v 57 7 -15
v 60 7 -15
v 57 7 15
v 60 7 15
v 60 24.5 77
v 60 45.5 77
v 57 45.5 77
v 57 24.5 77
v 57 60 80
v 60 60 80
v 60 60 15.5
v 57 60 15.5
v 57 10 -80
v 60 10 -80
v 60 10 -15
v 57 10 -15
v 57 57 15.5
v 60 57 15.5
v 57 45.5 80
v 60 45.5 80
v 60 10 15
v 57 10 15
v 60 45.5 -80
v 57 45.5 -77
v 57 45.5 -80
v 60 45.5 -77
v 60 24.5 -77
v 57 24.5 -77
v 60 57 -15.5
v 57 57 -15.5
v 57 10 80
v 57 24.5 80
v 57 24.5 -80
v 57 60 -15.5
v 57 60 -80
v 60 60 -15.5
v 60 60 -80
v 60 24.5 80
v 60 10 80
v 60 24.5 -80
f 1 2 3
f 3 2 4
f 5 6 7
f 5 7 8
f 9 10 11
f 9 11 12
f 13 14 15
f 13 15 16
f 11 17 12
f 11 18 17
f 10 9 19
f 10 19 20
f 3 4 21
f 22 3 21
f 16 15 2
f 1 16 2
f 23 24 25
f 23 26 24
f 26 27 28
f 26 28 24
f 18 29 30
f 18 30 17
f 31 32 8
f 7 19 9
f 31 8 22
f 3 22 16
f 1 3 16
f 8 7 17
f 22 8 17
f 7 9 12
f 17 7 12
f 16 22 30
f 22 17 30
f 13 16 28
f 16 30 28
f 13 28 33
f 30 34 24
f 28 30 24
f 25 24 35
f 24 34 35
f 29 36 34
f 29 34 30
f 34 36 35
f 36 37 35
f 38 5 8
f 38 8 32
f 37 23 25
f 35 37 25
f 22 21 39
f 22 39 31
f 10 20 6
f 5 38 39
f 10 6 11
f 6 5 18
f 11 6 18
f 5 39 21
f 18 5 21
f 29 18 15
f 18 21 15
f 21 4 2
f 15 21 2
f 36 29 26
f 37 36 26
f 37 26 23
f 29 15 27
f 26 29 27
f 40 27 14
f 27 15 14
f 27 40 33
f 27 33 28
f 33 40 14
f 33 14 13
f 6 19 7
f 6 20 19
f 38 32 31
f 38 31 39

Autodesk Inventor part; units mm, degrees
ref_plane "YZ Plane" through (0, 0, 0) normal (1, 0, 0) x (0, 1, 0)
ref_plane "XZ Plane" through (0, 0, 0) normal (0, 1, 0) x (-1, 0, 0)
ref_plane "XY Plane" through (0, 0, 0) normal (0, 0, 1) x (1, 0, 0)
sketch "스케치1" plane through (0, 0, 0) normal (0, 1, 0) x (-1, 0, 0)
  line L0 (60, 80) -> (-60, 80)
  line L1 (-60, 80) -> (-60, -80)
  line L2 (-60, -80) -> (60, -80)
  line L3 (60, -80) -> (60, 80)
  line L4 (60, 80) -> (-60, -80) construction
  line L5 (-60, 80) -> (60, -80) construction
  point P0 (0, 0)
  dimension "d0" = 120
  dimension "d1" = 160
extrude "돌출1" add sketch "스케치1" along normal blind 60
sketch "스케치2" plane through (0, 60, 0) normal (0, 1, 0) x (1, 0, 0)
  line L0 (60, -80) -> (60, 80) projected
  line L1 (60, 80) -> (-60, 80) projected
  line L2 (55, 102.1646) -> (-55, 102.1646)
  line L3 (-55, 102.1646) -> (-55, -89.711)
  line L4 (-55, -89.711) -> (55, -89.711)
  line L5 (55, -89.711) -> (55, 102.1646)
  line L6 (-60, 80) -> (-60, -80) projected
  point P0 (0, 0)
  point P1 (55, 80)
  point P2 (-55, 80)
  dimension "d6" = 5
  dimension "d7" = 5
extrude "돌출2" cut sketch "스케치2" against normal blind 40 contours L5 L4 L3 L1
sketch "스케치12" plane through (60, 0, -80) normal (0, 0, -1) x (-1, 0, 0)
  line L0 (-34.8463, 10) -> (156.2634, 10)
  line L1 (156.2634, 10) -> (156.2634, -36.9465)
  line L2 (156.2634, -36.9465) -> (-34.8463, -36.9465)
  line L3 (-34.8463, -36.9465) -> (-34.8463, 10)
  line L4 (0, 0) -> (120, 0) projected
  point P0 (60, 0)
  dimension "d85" = 10
extrude "돌출10" cut sketch "스케치12" against normal through all
sketch "스케치13" plane through (-55, 20, 80) normal (0, 0, 1) x (1, 0, 0)
  line L0 (0, 40) -> (0, 0) projected
  line L1 (0, 0) -> (110, 0) projected
  line L2 (0, 40) -> (110, 40)
  line L3 (110, 40) -> (110, 0)
  line L4 (110, 0) -> (0, 0)
  line L5 (0, 0) -> (0, 40)
  point P0 (55, -20)
extrude "돌출11" add sketch "스케치13" against normal blind 5
sketch "스케치14" plane through (55, 20, -80) normal (0, 0, -1) x (-1, 0, 0)
  line L0 (0, 0) -> (0, 40) projected
  line L1 (110, 0) -> (0, 0) projected
  line L2 (0, 40) -> (110, 40)
  line L3 (110, 40) -> (110, 0)
  line L4 (110, 0) -> (0, 0)
  line L5 (0, 0) -> (0, 40)
  point P0 (55, -20)
extrude "돌출12" add sketch "스케치14" against normal blind 5
sketch "스케치15" plane through (60, 60, -80) normal (0, 0, -1) x (-1, 0, 0)
  point P0 (60, -60)
sketch "스케치16" plane through (60, 60, -80) normal (0, 0, -1) x (-1, 0, 0)
  point P0 (60, -60)
sketch "스케치17" plane through (0, 20, 0) normal (0, 1, 0) x (1, 0, 0)
  line L0 (7, 27) -> (45, 27)
  line L1 (45, 27) -> (45, 65)
  line L2 (45, 65) -> (7, 65)
  line L3 (7, 65) -> (7, 27)
  line L4 (55, 75) -> (55, -75) projected
  line L5 (55, 75) -> (-55, 75) projected
  circle A0 centre (7, 27) radius 1.6
  circle A1 centre (7, 65) radius 1.6
  circle A2 centre (45, 65) radius 1.6
  circle A3 centre (45, 27) radius 1.6
  line L6 (-47.9371, 14.7215) -> (-7.9371, 14.7215)
  line L7 (-7.9371, 14.7215) -> (-7.9371, 64.7215)
  line L8 (-7.9371, 64.7215) -> (-47.9371, 64.7215)
  line L9 (-47.9371, 64.7215) -> (-47.9371, 14.7215)
  point P0 (0, 0)
  dimension "d92" = 38
  dimension "d93" = 38
  dimension "d95" = 10
  dimension "d96" = 10
  dimension "d97" = 3.2
  dimension "d98" = 3.2
  dimension "d99" = 3.2
  dimension "d100" = 3.2
  dimension "d113" = 40
  dimension "d114" = 50
extrude "돌출13" cut sketch "스케치17" against normal through all contours L3 A0 L0 | L0 A0 L3 | A3 L1 L0 | L0 L1 A3 | A1 L2 L3 | L3 L2 A1 | A2 L2 L1 | L1 L2 A2
sketch "스케치19" plane through (60, 60, -80) normal (0, 0, -1) x (-1, 0, 0)
  line L0 (5, -40) -> (115, -40) projected
  circle A0 centre (46.5, -25) radius 8.5
  circle A1 centre (73.5, -25) radius 8.5
  line L1 (5, 0) -> (5, -40) projected
  line L2 (115, -40) -> (115, 0) projected
  point P0 (60, -60)
  dimension "d105" = 27
  dimension "d106" = 41.5
  dimension "d107" = 17
  dimension "d108" = 17
  dimension "d109" = 15
  dimension "d110" = 15
extrude "돌출14" cut sketch "스케치19" against normal through all
sketch "스케치21" plane through (0, 20, 0) normal (0, 1, 0) x (1, 0, 0)
  circle A0 centre (5.4243, 8.1678) radius 7.5
  line L0 (-49.3888, 17.2731) -> (-9.3888, 17.2731)
  line L1 (-9.3888, 17.2731) -> (-9.3888, 67.2731)
  line L2 (-9.3888, 67.2731) -> (-49.3888, 67.2731)
  line L3 (-49.3888, 67.2731) -> (-49.3888, 17.2731)
  point P0 (0, 0)
  dimension "d117" = 15
  dimension "d118" = 50
  dimension "d119" = 40
extrude "돌출15" cut sketch "스케치21" against normal through all contours A0
sketch "스케치23" plane through (0, 20, 0) normal (0, 1, 0) x (1, 0, 0)
  line L0 (-48.6, -65) -> (20, -65)
  line L1 (20, -65) -> (20, -11.6)
  line L2 (20, -11.6) -> (-48.6, -11.6)
  line L3 (-48.6, -11.6) -> (-48.6, -65)
  line L4 (55, 75) -> (55, -75) projected
  line L5 (-55, -75) -> (55, -75) projected
  circle A0 centre (4.7, -62.45) radius 1.6
  circle A1 centre (6.03, -14.15) radius 1.6
  circle A2 centre (-46.05, -47.16) radius 1.6
  circle A3 centre (-46.05, -19.23) radius 1.6
  point P0 (0, 0)
  dimension "d123" = 68.6
  dimension "d124" = 53.4
  dimension "d125" = 35
  dimension "d126" = 10
  dimension "d127" = 3.2
  dimension "d128" = 15.3
  dimension "d129" = 2.55
  dimension "d130" = 3.2
  dimension "d131" = 13.97
  dimension "d132" = 2.55
  dimension "d133" = 3.2
  dimension "d134" = 35.56
  dimension "d135" = 3.2
  dimension "d136" = 2.55
  dimension "d137" = 2.55
  dimension "d138" = 7.63
extrude "돌출16" cut sketch "스케치23" against normal through all contours A0 | A1 | A2 | A3
sketch "스케치24" plane through (0, 20, 0) normal (0, 1, 0) x (1, 0, 0)
  line L0 (-55, -75) -> (55, -75) projected
  line L1 (55, 75) -> (55, -75) projected
  line L2 (-55, -75) -> (55, -75)
  line L3 (55, -75) -> (55, 75)
  line L4 (55, 75) -> (-55, 75)
  line L5 (-55, 75) -> (-55, -75)
  point P0 (0, 0)
extrude "돌출17" cut sketch "스케치24" against normal through all
sketch "스케치25" plane through (0, 60, 0) normal (0, 1, 0) x (1, 0, 0)
  line L0 (-60, -80) -> (60, -80) projected
  line L1 (60, 80) -> (-60, 80) projected
  line L2 (-60, -80) -> (57, -80)
  line L3 (57, -80) -> (57, 80)
  line L4 (57, 80) -> (-60, 80)
  line L5 (-60, 80) -> (-60, -80)
  line L6 (60, -80) -> (60, 80) projected
  point P0 (0, 0)
  point P1 (57, -80)
  dimension "d143" = 3
extrude "돌출18" cut sketch "스케치25" against normal through all contours L5 L1 L3 L0
sketch "스케치26" plane through (60, 60, 80) normal (1, 0, 0) x (0, 0, -1)
  line L0 (64.5, 14.0975) -> (95.5, 14.0975)
  line L1 (95.5, 14.0975) -> (95.5, -3)
  line L2 (95.5, -3) -> (64.5, -3)
  line L3 (64.5, -3) -> (64.5, 14.0975)
  line L4 (160, -50) -> (160, 0) projected
  line L5 (0, 0) -> (160, 0) projected
  point P0 (80, -60)
  point P1 (95.5, 0)
  point P2 (64.5, 0)
  dimension "d146" = 31
  dimension "d147" = 64.5
  dimension "d148" = 3
extrude "돌출19" cut sketch "스케치26" against normal through all contours L5 L1 L2 L3
sketch "스케치27" plane through (60, 10, 80) normal (1, 0, 0) x (0, 0, -1)
  line L0 (65, 7.9616) -> (95, 7.9616)
  line L1 (95, 7.9616) -> (95, -3)
  line L2 (95, -3) -> (65, -3)
  line L3 (65, -3) -> (65, 7.9616)
  line L4 (160, 0) -> (160, 50) projected
  line L5 (0, 0) -> (160, 0) projected
  point P0 (80, -10)
  point P1 (95, 0)
  point P2 (65, 0)
  dimension "d151" = 30
  dimension "d152" = 65
  dimension "d153" = 3
extrude "돌출20" add sketch "스케치27" against normal blind 3 contours L5 L1 L2 L3
sketch "스케치28" plane through (60, 10, 80) normal (1, 0, 0) x (0, 0, -1)
  line L0 (157, 35.5) -> (165.4106, 35.5)
  line L1 (165.4106, 35.5) -> (165.4106, 14.5)
  line L2 (165.4106, 14.5) -> (157, 14.5)
  line L3 (157, 14.5) -> (157, 35.5)
  line L4 (95.5, 50) -> (160, 50) projected
  line L5 (160, 0) -> (160, 50) projected
  point P0 (80, -10)
  dimension "d156" = 21
  dimension "d157" = 14.5
  dimension "d160" = 3
extrude "돌출21" cut sketch "스케치28" against normal through all
mirror "미러3" about plane through (0, 0, 0) normal (0, 0, 1) of "돌출21"
sketch "스케치29" plane through (60, 60, -15.5) normal (1, 0, 0) x (0, 0, -1)
  point P0 (-15.5, -60)
properties part number "본체 겉면 레이저 옆판"
